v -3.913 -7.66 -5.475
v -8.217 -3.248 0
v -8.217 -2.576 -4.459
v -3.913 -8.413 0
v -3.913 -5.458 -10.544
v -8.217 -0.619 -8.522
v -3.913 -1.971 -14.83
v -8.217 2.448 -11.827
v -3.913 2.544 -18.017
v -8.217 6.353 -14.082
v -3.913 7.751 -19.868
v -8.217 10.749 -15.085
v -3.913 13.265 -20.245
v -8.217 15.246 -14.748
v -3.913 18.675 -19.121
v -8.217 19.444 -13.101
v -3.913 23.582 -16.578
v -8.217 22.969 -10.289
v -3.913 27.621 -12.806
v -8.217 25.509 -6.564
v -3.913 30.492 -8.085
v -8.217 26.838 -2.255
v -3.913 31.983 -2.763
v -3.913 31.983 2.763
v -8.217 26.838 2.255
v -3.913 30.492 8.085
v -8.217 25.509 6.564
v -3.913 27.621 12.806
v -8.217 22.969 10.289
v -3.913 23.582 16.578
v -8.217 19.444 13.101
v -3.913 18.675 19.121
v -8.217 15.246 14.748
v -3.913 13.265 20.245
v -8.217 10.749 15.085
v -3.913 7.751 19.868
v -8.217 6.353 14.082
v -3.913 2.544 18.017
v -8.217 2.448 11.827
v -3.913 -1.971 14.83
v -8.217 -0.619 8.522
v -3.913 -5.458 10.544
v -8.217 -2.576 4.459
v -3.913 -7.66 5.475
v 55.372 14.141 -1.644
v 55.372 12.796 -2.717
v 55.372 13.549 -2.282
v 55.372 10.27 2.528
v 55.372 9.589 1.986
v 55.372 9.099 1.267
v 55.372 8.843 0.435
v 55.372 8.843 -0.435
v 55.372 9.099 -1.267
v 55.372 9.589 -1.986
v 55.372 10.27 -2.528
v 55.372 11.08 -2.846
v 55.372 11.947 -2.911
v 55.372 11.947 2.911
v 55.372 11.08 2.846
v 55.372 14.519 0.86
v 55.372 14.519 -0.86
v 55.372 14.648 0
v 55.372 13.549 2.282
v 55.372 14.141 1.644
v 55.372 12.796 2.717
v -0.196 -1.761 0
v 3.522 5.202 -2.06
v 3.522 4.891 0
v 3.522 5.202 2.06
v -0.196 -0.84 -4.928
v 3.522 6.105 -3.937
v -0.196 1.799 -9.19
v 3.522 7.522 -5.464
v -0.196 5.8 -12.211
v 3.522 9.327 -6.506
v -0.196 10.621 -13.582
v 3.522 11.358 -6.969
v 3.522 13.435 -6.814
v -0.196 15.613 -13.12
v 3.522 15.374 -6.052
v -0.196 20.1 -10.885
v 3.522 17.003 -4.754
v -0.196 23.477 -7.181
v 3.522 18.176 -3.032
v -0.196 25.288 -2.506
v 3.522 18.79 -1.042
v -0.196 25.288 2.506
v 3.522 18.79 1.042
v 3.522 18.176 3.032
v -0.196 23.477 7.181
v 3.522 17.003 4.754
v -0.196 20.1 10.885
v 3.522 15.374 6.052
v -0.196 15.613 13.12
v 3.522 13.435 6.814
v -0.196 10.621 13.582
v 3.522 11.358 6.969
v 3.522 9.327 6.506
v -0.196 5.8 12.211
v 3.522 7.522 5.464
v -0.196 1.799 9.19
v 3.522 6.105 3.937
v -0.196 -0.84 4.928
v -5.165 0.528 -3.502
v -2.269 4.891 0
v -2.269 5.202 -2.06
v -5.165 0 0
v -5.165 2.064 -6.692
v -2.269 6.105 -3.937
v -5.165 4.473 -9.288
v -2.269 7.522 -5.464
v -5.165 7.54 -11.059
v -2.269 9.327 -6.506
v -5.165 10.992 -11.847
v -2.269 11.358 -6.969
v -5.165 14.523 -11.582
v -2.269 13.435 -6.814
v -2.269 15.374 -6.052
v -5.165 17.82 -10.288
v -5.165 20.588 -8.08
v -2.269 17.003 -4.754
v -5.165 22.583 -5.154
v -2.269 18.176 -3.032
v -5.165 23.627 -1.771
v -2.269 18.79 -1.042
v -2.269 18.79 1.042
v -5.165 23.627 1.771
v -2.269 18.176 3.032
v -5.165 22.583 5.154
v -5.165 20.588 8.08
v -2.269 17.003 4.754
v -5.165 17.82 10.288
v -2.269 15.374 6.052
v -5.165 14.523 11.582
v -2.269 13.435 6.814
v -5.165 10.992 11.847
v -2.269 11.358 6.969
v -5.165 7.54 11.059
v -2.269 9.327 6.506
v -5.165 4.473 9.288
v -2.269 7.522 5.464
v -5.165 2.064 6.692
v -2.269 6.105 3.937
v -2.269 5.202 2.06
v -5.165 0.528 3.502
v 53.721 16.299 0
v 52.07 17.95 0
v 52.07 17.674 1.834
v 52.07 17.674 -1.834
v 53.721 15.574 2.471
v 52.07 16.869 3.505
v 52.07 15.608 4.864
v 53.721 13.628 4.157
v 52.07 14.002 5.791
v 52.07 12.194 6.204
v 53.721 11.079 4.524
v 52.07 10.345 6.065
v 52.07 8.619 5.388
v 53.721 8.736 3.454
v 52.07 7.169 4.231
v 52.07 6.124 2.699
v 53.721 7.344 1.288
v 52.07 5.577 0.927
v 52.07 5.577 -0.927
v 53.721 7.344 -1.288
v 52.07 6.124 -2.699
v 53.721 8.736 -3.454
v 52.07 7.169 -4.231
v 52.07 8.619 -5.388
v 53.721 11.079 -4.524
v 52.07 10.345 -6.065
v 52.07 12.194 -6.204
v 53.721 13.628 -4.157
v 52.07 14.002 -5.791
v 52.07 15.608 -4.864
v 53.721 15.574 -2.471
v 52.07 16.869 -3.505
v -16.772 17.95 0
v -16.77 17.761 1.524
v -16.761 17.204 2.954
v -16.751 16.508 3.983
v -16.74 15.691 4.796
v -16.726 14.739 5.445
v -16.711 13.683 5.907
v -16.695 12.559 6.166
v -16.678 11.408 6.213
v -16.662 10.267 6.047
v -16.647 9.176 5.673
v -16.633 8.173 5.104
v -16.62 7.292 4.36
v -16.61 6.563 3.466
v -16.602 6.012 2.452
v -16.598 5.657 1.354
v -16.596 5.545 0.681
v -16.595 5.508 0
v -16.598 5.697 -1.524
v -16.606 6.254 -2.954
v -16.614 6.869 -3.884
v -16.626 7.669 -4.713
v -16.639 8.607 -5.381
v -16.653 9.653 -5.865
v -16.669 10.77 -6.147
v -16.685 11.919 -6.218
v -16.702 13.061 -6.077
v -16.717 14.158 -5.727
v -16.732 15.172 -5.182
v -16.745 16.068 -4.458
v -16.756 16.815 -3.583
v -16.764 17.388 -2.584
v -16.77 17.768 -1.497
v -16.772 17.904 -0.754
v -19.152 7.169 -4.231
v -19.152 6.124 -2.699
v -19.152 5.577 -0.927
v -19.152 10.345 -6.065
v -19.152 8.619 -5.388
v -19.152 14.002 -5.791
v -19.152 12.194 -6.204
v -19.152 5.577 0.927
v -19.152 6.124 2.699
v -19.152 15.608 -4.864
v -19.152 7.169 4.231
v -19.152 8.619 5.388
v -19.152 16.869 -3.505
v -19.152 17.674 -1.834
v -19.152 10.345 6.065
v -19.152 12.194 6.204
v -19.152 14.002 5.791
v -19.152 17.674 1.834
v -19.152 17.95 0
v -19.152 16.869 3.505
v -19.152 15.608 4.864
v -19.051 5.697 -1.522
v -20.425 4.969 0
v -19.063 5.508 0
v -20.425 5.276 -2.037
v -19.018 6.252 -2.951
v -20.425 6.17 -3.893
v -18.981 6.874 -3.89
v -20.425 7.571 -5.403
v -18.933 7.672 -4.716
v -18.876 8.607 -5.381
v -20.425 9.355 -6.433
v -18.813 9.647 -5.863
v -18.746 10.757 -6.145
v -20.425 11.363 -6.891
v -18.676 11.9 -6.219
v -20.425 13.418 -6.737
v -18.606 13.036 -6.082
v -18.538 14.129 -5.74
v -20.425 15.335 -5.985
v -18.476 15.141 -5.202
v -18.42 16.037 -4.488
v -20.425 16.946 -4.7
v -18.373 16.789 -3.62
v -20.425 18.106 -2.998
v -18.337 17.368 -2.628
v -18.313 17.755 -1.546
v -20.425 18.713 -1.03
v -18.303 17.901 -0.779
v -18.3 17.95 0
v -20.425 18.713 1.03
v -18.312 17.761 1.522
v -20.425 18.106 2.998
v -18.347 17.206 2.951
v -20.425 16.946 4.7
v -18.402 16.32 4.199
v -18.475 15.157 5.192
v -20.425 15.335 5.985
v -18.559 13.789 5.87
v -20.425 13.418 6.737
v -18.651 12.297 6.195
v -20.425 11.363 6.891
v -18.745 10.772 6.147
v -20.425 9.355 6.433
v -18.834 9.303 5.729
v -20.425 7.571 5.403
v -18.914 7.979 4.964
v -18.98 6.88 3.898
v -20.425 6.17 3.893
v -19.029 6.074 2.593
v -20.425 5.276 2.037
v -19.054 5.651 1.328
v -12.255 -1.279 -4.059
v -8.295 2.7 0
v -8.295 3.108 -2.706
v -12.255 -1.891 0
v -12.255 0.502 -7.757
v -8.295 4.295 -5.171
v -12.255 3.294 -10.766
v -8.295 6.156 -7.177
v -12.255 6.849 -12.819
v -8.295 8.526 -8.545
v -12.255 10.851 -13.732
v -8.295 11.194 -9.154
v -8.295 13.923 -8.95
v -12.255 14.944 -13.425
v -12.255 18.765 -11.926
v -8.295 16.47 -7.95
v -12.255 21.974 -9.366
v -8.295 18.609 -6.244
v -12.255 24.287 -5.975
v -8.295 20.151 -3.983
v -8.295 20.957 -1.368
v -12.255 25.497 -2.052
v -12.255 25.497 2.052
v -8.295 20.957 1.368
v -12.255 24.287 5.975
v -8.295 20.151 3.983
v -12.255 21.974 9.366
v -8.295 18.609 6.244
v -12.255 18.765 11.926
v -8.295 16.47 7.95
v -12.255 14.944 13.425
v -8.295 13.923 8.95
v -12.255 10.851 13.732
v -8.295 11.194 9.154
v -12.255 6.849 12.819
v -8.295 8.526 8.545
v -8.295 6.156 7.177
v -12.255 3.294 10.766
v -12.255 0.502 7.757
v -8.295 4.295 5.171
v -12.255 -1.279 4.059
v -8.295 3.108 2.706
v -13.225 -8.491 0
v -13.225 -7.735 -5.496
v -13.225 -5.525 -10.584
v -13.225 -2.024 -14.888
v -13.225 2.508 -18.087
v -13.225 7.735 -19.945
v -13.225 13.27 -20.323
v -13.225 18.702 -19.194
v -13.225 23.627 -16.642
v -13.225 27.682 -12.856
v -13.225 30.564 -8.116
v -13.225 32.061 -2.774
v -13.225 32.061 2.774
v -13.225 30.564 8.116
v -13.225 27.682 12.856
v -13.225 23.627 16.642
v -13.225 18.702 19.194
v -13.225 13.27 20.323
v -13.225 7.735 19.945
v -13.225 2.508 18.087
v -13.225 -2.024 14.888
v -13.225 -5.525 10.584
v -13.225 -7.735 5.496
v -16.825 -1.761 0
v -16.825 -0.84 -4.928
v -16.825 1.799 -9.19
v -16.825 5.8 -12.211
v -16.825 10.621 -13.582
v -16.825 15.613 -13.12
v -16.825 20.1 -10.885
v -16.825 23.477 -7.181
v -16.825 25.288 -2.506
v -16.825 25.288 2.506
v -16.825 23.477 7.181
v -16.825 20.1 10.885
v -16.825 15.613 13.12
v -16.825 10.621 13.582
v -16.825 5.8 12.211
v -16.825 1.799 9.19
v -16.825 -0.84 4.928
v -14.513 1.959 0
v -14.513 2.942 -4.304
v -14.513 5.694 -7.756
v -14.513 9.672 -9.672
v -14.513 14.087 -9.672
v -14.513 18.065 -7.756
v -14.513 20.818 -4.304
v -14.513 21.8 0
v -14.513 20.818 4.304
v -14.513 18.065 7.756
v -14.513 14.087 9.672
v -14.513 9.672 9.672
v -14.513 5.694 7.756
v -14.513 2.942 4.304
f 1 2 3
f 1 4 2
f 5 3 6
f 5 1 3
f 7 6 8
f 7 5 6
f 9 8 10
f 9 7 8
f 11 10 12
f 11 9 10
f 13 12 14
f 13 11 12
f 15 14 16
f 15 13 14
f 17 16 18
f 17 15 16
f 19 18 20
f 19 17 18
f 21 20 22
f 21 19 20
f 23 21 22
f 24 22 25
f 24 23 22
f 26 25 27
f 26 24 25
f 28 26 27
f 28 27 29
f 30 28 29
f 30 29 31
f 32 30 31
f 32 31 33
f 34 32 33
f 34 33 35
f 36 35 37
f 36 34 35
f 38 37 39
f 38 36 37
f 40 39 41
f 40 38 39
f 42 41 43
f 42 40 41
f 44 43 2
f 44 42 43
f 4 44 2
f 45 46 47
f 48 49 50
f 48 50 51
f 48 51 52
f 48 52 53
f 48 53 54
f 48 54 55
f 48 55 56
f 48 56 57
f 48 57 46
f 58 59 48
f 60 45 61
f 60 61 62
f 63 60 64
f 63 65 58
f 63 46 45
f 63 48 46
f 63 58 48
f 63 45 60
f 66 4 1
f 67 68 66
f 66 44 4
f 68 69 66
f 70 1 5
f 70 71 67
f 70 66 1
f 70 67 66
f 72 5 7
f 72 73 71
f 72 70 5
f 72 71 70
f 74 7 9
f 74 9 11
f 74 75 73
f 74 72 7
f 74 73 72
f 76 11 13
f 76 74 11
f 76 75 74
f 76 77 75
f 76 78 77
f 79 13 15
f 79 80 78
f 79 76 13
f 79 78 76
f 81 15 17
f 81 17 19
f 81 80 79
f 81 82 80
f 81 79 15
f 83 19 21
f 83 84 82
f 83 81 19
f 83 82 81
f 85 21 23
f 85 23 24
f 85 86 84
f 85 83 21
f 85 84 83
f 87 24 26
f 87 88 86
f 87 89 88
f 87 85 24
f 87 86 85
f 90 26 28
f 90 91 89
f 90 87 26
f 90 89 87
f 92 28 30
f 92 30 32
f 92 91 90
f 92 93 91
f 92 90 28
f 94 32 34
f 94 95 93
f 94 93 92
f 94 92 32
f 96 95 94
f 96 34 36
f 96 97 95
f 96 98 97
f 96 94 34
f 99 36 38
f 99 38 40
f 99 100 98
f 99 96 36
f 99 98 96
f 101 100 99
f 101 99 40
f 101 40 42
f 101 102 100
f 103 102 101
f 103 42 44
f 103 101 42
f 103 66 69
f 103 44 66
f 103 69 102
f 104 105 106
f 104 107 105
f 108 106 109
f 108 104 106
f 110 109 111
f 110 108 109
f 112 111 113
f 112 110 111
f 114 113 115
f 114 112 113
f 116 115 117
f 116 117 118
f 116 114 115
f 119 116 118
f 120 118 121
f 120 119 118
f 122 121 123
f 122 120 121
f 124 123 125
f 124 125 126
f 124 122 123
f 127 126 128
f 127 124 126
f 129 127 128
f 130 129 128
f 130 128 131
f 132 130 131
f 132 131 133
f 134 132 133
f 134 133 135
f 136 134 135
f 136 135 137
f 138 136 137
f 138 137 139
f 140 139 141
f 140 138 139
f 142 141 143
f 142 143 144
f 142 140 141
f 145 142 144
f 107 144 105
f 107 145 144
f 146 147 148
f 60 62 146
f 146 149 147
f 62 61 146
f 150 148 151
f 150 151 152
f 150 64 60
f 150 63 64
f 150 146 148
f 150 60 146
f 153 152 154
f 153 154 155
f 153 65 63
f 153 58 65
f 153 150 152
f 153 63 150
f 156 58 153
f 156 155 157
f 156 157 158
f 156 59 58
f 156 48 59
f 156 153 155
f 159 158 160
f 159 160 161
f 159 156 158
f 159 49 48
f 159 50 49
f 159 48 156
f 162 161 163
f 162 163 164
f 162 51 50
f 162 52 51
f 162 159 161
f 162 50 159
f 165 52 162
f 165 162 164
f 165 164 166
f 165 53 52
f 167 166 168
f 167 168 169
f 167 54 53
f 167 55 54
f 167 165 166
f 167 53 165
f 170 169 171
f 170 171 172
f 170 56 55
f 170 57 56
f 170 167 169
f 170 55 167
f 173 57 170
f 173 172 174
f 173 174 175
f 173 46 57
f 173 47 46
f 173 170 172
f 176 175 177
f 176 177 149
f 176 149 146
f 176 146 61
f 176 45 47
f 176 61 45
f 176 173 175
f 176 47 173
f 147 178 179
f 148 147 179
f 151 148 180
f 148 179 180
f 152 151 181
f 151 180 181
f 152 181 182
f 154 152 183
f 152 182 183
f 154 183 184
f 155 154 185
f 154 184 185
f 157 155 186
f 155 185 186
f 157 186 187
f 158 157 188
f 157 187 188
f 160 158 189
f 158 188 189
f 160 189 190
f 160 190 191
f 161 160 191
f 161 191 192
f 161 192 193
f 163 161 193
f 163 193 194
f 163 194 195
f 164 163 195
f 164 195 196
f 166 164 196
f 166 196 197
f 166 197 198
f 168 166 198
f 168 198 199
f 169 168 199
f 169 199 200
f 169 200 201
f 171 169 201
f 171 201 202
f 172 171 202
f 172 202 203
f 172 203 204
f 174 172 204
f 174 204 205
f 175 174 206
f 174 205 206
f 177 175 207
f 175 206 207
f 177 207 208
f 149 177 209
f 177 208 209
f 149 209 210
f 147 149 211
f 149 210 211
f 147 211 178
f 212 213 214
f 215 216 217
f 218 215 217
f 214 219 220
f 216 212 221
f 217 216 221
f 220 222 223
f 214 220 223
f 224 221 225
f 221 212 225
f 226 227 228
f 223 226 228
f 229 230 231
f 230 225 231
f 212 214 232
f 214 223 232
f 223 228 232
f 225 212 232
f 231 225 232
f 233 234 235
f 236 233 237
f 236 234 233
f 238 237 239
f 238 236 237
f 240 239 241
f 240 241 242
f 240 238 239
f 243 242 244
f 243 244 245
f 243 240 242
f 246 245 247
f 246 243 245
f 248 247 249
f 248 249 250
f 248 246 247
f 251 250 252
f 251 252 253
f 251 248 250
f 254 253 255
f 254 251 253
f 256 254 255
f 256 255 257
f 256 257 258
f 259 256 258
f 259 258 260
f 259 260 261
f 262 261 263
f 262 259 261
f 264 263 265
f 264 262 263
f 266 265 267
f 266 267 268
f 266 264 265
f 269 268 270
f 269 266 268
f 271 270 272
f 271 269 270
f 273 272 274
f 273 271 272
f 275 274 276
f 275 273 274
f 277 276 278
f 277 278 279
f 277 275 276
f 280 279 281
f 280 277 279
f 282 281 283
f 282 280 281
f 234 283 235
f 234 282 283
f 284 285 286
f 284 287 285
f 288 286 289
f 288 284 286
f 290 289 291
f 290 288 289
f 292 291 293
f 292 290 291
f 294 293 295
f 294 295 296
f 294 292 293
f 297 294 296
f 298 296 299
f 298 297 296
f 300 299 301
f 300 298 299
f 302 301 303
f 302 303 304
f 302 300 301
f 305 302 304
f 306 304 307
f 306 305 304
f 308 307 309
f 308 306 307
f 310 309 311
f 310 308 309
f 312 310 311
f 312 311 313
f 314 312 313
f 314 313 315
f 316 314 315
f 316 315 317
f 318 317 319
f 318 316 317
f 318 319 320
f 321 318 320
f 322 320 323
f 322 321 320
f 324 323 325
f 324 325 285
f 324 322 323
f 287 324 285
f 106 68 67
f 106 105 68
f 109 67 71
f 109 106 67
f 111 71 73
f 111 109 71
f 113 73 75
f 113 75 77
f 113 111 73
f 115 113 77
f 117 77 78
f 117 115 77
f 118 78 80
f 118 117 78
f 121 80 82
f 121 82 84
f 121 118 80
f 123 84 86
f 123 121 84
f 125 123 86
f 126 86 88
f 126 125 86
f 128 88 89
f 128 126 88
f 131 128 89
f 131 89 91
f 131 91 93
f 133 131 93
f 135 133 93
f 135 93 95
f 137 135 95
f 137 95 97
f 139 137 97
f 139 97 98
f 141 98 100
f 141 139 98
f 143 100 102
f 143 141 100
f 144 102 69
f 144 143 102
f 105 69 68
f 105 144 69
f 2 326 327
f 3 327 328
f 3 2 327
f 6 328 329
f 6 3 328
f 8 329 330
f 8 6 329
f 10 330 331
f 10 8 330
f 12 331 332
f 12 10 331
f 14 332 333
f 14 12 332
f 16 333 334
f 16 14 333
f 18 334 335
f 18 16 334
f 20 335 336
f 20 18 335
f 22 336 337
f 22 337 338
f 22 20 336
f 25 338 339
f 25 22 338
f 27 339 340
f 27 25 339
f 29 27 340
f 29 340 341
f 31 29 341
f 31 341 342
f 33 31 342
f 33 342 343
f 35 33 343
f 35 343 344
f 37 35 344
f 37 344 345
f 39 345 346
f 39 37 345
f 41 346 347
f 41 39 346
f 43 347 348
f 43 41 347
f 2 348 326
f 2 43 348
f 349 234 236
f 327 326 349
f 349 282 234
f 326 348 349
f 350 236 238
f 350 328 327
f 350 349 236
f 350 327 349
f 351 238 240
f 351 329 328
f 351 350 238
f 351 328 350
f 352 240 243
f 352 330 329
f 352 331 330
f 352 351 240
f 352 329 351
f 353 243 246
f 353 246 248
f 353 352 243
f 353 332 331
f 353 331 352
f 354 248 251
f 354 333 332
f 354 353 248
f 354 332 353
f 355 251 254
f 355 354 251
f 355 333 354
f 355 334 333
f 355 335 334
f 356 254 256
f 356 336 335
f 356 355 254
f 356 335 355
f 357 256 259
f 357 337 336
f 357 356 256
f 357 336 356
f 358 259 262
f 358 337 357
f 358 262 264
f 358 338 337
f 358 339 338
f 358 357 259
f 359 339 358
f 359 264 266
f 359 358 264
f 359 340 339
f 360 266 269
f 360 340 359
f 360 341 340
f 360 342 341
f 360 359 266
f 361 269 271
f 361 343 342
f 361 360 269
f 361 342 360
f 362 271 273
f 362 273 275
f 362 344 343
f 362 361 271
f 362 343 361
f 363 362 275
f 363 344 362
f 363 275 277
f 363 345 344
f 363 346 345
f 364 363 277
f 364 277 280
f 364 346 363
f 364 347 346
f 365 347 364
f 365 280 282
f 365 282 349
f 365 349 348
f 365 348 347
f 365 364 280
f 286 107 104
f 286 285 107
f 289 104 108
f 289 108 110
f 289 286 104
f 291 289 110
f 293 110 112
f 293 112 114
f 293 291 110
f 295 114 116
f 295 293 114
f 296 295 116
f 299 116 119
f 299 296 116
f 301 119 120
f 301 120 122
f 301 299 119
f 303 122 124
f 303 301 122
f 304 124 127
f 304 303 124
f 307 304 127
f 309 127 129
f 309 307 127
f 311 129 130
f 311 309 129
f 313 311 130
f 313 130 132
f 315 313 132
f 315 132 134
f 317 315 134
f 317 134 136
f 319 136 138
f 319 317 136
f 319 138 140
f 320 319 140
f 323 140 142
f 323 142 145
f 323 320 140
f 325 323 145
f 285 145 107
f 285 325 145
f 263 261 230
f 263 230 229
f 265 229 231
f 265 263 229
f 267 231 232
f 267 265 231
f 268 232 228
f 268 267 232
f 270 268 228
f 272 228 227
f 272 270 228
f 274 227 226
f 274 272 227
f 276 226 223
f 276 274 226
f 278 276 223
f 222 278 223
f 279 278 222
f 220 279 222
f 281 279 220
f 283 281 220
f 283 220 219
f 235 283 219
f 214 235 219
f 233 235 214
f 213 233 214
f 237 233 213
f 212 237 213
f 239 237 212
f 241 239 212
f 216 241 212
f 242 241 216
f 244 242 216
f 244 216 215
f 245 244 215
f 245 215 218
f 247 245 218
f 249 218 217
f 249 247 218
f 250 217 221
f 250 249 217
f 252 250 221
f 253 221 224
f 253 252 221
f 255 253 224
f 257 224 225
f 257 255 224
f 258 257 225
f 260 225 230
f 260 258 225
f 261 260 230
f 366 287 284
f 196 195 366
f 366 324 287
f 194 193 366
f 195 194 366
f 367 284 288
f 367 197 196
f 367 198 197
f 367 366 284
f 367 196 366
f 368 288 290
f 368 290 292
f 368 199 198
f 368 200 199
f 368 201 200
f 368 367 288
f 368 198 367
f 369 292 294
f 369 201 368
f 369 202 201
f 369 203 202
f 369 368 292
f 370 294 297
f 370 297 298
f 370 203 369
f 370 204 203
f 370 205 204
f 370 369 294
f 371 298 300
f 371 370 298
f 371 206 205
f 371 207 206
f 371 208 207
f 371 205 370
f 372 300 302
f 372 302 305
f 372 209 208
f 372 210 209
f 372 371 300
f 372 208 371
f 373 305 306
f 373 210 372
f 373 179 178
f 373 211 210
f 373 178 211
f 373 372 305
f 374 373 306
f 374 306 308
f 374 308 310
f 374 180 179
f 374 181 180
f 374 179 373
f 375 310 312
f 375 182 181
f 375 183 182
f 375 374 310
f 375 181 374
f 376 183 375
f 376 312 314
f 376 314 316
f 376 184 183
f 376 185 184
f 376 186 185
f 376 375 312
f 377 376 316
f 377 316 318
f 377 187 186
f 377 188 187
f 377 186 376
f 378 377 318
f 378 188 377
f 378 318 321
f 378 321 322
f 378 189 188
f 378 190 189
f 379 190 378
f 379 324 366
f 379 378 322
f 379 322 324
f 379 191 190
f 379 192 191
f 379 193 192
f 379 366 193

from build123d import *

# Parameters (mm, degrees)
F2_R     = 6.2211982037
F3_DEPTH = 19.1516
F4_DEPTH = 55.372
F5_SIZE  = 3.302


# Not quite as in the source:
# - the program builds the solid bodies; features that only make, move or delete a surface that nothing else refers to are left out


with BuildPart() as f1:
    # F0 (on Top) → F1 (revolve)
    with BuildSketch(Plane.XY):
        Polygon((-17.0599853833, 6.2996733477), (-20.4250291926, 4.9693077386), (-13.2254017106, -8.4908647026), (-8.2169655835, -3.2476578449), (-3.9128408491, -8.4126079255), (3.521556964, 4.8910505621), (-2.2694479322, 4.8910505621), (-5.1649496812, 0), (-8.2952223605, 2.6998602059), (-12.2546622766, -1.8907947353), align=None)
    revolve(axis=Axis((-9.930120464, 11.8798027962, 0), (1, 0, 0)))

    # F2 (on Right) → F3 (join)
    with BuildSketch(Plane.YZ):
        with Locations((11.7291258648, 0)):
            Circle(F2_R)
    extrude(amount=-F3_DEPTH)

    # F4 (add): a face of the model
    f4_faces = [f1.faces().sort_by_distance(p)[0] for p in [
        (0, 11.7291258648, 0),
    ]]
    extrude(f4_faces, amount=F4_DEPTH)

    # F5
    f5_edges = [f1.edges().sort_by_distance(p)[0] for p in [
        (55.372, 5.507928, 0),
    ]]
    chamfer(f5_edges, length=F5_SIZE)


solid = f1.part
